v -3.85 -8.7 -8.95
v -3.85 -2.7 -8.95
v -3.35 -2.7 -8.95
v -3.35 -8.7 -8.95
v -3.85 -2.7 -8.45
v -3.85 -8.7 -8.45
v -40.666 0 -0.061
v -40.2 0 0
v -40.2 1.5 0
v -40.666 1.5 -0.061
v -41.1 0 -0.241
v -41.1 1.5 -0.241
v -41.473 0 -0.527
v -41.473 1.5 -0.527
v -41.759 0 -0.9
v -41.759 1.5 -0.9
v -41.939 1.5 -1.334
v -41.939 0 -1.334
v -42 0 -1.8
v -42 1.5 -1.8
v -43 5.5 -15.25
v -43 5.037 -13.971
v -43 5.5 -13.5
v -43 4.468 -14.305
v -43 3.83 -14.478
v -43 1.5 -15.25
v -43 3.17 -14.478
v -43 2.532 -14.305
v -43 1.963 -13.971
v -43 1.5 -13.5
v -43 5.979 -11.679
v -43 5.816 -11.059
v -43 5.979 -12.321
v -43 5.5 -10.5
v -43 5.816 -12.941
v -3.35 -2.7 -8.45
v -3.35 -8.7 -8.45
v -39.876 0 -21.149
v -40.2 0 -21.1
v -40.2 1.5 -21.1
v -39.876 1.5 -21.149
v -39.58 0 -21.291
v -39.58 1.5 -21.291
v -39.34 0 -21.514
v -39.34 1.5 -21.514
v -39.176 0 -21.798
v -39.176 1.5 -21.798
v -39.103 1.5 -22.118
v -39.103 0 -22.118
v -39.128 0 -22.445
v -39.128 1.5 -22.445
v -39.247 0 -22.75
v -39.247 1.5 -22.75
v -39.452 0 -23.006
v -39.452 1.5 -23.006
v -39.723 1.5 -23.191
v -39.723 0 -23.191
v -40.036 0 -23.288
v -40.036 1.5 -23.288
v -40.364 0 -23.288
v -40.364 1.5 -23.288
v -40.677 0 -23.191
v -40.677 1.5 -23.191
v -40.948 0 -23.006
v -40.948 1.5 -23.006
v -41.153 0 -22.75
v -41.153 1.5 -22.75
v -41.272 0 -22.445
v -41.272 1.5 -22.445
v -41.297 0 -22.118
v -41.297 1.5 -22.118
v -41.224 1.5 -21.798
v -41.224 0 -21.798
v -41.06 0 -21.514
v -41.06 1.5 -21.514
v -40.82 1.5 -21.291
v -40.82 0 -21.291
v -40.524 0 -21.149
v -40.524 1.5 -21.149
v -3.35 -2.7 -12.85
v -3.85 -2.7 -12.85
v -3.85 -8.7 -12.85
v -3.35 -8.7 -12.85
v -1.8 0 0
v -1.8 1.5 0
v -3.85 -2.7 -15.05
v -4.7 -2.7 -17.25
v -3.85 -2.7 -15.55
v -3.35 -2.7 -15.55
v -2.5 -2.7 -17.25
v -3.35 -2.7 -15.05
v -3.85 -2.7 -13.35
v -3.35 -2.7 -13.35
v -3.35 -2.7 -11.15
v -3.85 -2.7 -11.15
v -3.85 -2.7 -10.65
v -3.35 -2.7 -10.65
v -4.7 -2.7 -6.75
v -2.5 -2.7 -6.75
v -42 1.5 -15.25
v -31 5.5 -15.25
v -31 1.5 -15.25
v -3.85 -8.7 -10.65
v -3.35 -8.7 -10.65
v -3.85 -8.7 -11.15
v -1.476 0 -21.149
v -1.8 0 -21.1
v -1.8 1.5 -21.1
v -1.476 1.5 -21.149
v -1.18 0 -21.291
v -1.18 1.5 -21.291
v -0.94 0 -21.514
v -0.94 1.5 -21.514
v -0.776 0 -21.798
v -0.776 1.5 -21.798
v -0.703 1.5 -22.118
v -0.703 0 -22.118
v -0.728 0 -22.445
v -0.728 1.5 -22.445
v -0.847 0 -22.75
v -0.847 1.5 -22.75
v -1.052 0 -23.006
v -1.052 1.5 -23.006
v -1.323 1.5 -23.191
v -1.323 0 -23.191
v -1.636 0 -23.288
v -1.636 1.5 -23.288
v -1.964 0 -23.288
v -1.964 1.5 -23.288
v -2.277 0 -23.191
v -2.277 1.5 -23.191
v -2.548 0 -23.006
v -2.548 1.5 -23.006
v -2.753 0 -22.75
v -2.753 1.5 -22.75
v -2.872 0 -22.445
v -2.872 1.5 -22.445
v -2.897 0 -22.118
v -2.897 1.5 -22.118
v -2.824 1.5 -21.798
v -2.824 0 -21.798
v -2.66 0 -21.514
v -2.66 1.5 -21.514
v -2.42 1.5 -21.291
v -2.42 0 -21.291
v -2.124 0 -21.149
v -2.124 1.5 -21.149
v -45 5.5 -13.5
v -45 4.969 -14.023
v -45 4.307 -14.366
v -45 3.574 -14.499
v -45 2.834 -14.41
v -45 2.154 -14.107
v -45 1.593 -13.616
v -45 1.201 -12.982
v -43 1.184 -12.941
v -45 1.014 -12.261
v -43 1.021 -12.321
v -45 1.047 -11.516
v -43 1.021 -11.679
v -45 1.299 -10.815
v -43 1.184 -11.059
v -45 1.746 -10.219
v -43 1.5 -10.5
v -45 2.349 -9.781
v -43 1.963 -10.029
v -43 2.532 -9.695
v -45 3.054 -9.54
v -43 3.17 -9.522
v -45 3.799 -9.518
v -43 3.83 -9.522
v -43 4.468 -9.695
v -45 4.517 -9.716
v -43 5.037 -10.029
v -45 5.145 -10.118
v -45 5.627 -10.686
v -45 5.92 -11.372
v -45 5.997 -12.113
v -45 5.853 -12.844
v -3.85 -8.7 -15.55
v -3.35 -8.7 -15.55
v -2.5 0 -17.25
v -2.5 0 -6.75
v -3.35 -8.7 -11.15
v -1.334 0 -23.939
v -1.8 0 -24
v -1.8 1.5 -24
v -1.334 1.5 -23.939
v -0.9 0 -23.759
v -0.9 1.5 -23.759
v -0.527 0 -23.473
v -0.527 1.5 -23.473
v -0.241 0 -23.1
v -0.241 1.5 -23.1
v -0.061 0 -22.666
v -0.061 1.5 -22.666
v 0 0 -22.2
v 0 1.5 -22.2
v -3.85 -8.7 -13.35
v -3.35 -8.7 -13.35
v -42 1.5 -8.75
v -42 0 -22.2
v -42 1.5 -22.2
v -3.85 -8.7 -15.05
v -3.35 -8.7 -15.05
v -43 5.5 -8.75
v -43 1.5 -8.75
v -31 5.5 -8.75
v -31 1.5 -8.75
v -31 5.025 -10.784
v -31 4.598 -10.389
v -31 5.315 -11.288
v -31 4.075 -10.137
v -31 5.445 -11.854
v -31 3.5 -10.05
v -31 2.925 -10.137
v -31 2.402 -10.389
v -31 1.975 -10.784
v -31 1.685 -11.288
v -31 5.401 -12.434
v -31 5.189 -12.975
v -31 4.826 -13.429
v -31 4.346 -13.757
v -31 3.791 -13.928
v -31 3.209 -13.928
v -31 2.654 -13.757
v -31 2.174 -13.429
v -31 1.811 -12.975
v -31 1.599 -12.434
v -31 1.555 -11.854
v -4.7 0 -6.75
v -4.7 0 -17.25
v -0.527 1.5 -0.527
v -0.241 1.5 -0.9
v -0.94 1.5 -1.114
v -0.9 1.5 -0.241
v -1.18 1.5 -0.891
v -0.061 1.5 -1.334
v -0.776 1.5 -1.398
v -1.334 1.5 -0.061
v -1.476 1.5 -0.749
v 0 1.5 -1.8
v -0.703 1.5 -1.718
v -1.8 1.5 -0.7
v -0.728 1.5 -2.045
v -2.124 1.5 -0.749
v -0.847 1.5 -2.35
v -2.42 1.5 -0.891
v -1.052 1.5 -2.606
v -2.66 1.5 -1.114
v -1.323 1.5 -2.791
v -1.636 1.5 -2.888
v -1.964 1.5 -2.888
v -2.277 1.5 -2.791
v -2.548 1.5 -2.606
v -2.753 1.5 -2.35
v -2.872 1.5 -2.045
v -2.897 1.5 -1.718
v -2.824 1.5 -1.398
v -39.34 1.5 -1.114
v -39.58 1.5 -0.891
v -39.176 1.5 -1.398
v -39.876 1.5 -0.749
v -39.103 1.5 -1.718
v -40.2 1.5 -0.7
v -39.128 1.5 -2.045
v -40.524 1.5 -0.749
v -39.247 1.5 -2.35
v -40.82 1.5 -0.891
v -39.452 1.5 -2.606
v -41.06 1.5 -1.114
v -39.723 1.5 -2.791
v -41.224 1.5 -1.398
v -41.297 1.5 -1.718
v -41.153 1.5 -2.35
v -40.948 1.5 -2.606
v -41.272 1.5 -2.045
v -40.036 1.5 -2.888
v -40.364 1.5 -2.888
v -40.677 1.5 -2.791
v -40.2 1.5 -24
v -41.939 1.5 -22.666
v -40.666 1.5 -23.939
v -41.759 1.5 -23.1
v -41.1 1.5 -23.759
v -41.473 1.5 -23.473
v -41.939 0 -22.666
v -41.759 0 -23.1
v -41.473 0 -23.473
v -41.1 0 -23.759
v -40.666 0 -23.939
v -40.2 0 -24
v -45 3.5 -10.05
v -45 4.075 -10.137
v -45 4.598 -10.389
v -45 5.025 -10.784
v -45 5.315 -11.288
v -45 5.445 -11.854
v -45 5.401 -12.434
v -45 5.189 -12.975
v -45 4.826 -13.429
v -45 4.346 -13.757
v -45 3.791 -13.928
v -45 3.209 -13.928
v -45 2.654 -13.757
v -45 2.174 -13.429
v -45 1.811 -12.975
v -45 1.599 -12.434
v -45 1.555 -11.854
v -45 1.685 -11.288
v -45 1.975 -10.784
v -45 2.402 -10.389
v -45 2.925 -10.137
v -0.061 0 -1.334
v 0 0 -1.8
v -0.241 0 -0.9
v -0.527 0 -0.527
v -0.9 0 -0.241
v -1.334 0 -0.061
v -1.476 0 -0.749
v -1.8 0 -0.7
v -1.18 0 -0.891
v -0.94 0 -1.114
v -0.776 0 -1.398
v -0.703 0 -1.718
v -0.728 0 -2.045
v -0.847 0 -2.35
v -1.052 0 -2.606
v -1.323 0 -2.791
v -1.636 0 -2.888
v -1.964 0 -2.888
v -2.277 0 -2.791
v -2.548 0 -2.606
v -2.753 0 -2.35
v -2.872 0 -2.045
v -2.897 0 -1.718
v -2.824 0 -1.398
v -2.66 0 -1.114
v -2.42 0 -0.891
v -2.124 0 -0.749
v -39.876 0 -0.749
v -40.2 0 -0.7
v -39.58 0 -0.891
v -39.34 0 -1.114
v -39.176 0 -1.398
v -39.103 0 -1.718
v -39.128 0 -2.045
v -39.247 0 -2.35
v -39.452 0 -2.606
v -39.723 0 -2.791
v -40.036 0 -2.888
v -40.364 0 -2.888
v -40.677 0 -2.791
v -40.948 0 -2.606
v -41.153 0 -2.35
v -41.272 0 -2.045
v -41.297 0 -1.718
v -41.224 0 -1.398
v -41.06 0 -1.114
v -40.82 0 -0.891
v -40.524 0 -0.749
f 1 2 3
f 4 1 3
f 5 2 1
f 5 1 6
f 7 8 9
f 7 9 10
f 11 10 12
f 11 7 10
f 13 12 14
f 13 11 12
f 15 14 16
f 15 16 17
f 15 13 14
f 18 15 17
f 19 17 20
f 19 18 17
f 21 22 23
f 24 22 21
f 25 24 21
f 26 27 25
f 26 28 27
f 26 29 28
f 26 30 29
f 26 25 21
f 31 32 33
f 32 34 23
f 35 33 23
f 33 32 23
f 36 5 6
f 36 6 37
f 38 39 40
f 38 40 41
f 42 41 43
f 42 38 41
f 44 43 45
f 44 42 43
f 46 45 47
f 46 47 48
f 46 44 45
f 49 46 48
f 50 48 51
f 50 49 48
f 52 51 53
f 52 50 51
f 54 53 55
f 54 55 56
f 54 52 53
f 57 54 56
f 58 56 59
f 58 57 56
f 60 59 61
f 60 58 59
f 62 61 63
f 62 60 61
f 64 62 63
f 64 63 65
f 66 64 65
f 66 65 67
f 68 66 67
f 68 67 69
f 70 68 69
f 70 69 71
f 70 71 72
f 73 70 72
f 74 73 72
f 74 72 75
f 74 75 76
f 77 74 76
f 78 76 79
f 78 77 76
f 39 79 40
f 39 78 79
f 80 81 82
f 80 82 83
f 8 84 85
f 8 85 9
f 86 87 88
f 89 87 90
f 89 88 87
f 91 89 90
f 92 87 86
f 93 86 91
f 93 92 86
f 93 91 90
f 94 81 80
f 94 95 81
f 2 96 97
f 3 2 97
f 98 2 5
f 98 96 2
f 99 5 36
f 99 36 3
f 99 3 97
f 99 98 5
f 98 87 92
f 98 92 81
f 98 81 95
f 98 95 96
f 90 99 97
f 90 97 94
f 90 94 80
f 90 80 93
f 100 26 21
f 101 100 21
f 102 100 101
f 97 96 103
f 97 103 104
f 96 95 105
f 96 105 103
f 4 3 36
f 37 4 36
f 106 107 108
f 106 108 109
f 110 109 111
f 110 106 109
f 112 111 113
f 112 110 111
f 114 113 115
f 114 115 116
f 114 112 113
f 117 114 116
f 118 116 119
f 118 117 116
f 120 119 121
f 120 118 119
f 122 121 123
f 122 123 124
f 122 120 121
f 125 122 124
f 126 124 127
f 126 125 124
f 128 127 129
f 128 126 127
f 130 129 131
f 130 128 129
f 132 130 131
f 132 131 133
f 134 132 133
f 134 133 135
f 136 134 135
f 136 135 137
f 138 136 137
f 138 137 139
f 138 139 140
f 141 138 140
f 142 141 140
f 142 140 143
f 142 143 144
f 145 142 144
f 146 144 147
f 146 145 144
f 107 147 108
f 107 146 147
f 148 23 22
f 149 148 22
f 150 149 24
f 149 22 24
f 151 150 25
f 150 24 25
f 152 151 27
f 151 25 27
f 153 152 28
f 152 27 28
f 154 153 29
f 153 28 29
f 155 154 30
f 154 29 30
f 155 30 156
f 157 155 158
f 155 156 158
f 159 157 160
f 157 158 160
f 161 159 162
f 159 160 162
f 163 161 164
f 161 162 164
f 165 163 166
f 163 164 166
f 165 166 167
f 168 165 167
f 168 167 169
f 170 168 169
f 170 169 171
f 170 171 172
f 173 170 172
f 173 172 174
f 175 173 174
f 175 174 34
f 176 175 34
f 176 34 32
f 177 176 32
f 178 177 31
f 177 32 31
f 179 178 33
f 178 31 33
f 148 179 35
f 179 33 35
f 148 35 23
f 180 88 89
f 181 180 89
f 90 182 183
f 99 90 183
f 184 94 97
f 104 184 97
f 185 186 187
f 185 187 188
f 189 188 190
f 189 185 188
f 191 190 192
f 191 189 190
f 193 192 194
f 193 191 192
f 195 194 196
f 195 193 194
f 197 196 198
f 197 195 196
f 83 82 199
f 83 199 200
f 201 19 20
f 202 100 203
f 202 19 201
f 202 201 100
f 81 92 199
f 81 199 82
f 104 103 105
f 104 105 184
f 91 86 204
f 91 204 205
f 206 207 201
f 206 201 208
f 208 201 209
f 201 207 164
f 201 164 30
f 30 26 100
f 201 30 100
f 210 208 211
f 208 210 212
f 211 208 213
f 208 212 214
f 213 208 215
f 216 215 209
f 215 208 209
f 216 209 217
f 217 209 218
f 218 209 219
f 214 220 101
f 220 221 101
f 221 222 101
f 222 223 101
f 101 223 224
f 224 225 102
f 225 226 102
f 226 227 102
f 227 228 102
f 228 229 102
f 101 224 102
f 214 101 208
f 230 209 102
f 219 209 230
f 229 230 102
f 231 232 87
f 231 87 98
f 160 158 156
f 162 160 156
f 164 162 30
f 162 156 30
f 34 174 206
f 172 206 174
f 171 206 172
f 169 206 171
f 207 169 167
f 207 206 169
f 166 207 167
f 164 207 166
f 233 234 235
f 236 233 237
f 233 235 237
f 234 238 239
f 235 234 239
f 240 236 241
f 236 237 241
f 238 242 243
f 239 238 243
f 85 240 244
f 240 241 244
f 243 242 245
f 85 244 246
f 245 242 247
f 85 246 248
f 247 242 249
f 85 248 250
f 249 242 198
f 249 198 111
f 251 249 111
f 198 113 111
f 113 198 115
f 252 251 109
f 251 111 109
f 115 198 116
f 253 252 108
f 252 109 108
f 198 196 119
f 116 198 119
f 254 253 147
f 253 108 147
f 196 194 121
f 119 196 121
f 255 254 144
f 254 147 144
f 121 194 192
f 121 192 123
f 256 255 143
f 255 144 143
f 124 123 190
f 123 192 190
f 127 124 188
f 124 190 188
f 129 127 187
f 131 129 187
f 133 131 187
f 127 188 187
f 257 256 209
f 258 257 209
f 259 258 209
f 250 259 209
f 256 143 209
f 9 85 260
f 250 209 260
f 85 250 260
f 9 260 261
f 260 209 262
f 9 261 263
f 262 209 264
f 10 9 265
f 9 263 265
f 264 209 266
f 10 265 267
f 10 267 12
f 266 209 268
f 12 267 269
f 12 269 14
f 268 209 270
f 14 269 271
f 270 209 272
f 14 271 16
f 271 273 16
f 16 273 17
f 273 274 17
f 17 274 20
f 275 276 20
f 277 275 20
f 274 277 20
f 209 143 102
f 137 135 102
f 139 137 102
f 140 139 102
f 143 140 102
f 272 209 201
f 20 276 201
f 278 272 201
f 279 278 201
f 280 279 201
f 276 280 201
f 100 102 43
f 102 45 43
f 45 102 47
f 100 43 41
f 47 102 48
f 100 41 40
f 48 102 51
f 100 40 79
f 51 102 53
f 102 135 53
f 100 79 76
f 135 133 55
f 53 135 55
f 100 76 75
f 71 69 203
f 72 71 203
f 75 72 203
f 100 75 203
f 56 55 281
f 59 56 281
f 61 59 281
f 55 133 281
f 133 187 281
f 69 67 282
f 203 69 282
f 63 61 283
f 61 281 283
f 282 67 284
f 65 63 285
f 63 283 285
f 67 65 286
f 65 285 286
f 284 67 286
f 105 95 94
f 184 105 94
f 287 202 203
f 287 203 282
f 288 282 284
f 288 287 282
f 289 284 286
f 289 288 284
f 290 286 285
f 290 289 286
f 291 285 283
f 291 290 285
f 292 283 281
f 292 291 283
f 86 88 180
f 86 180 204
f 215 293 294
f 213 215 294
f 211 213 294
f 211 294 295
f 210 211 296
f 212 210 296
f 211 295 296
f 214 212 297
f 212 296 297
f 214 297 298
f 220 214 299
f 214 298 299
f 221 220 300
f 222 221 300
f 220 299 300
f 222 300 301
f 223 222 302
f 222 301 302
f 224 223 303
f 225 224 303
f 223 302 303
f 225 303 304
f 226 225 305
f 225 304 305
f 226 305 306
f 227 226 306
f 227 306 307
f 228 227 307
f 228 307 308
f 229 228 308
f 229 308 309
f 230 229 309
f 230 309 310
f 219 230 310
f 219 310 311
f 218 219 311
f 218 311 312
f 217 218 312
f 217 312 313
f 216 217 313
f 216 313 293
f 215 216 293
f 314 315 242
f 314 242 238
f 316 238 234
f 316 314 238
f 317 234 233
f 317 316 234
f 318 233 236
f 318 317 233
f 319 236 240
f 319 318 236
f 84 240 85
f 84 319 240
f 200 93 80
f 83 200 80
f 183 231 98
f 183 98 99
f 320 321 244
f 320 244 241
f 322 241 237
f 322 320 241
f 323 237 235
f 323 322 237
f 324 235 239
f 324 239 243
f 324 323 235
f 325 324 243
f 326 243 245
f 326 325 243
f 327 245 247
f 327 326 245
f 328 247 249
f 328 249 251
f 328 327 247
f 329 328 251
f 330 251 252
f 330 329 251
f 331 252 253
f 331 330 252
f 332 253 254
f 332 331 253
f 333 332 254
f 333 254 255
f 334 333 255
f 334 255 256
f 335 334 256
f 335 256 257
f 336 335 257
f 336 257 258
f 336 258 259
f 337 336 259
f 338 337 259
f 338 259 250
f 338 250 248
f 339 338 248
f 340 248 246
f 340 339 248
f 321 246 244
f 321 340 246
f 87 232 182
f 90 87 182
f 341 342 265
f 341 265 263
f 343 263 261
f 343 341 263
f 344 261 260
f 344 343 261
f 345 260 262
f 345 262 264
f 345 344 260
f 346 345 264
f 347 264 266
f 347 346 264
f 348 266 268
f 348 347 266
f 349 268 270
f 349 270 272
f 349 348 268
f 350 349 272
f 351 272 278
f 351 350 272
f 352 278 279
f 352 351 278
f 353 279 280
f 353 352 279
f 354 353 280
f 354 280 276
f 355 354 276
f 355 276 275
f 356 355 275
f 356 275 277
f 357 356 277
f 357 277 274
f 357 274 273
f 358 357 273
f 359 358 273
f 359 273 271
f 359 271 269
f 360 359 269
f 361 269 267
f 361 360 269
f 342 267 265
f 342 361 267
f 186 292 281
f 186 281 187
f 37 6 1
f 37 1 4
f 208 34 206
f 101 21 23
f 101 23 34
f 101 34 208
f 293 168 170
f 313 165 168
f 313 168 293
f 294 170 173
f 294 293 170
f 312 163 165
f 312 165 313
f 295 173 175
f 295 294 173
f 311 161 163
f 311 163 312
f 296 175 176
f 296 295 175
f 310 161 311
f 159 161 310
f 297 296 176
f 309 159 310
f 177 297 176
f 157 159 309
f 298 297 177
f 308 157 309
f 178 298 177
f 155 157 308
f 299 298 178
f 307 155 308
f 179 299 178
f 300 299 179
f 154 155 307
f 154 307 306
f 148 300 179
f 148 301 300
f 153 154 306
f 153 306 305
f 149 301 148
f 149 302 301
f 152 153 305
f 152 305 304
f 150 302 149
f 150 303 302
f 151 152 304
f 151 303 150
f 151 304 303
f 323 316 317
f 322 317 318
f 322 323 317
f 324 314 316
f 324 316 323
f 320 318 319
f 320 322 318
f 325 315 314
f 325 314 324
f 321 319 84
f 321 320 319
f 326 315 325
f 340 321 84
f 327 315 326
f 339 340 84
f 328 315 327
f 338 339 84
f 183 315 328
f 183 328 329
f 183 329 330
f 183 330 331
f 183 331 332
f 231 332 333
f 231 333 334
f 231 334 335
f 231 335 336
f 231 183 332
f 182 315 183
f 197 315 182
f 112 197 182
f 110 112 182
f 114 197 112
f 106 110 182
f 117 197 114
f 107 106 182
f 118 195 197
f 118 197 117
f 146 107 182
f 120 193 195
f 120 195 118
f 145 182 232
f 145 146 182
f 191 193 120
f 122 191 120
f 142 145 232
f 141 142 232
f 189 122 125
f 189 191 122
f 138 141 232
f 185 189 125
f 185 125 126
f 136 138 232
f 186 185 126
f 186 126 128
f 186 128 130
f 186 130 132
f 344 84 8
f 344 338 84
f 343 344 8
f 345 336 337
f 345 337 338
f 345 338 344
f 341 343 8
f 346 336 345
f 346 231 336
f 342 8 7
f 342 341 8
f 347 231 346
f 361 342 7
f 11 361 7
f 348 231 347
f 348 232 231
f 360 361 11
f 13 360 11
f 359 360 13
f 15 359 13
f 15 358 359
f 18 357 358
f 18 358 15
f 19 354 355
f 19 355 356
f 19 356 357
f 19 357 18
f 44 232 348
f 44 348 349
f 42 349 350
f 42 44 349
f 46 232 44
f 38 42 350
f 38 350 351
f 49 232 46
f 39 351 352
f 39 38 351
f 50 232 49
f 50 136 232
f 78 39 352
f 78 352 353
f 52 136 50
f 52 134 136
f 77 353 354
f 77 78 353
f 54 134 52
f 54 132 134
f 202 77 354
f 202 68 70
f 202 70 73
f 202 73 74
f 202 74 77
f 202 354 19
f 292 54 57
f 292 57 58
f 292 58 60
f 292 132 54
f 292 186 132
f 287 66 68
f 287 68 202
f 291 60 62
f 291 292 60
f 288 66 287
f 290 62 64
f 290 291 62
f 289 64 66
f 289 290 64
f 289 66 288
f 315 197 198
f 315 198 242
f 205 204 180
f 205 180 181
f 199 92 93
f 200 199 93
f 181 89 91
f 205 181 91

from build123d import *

# Parameters (mm, degrees)
SKETCH1_R           = 1.1
BOSS_EXTRUDE1_DEPTH = 1.5
SKETCH2_W           = 12
SKETCH2_H           = 6.5
BOSS_EXTRUDE2_DEPTH = 4
SKETCH5_R           = 2.5
BOSS_EXTRUDE3_DEPTH = 2
SKETCH6_R           = 1.95
CUT_EXTRUDE1_DEPTH  = 15.02758553
SKETCH8_W           = 2.2
SKETCH8_H           = 10.5
BOSS_EXTRUDE4_DEPTH = 2.7
SKETCH9_W           = 0.5
SKETCH9_H           = 0.5
BOSS_EXTRUDE5_DEPTH = 6
LPATTERN1_COUNT     = 4
LPATTERN1_PITCH     = 2.2


with BuildPart() as part:
    # Sketch1 → Boss-Extrude1 (new body)
    with BuildSketch(Plane(origin=(0, 0, 0), x_dir=(1, 0, 0), z_dir=(0, 1, 0))):
        with BuildLine():
            Line((-1.8, 0), (-40.2, 0))
            ThreePointArc((-40.2, 0), (-41.472792206, 0.527207794), (-42, 1.8))
            Line((-42, 1.8), (-42, 22.2))
            ThreePointArc((-42, 22.2), (-41.472792206, 23.472792206), (-40.2, 24))
            Line((-40.2, 24), (-1.8, 24))
            ThreePointArc((-1.8, 24), (-0.527207794, 23.472792206), (0, 22.2))
            Line((0, 22.2), (0, 1.8))
            ThreePointArc((0, 1.8), (-0.527207794, 0.527207794), (-1.8, 0))
        make_face()
        with Locations(Location((-40.2, 1.8, 0), (0, 0, 270))):
            Circle(SKETCH1_R, mode=Mode.SUBTRACT)
        with Locations(Location((-1.8, 1.8, 0), (0, 0, 270))):
            Circle(SKETCH1_R, mode=Mode.SUBTRACT)
        with Locations(Location((-1.8, 22.2, 0), (0, 0, 270))):
            Circle(SKETCH1_R, mode=Mode.SUBTRACT)
        with Locations(Location((-40.2, 22.2, 0), (0, 0, 270))):
            Circle(SKETCH1_R, mode=Mode.SUBTRACT)
    extrude(amount=BOSS_EXTRUDE1_DEPTH)

    # Sketch2 → Boss-Extrude2 (add)
    with BuildSketch(Plane(origin=(0, 1.5, 0), x_dir=(1, 0, 0), z_dir=(0, 1, 0))):
        with Locations((-37, 12)):
            Rectangle(SKETCH2_W, SKETCH2_H)
    extrude(amount=BOSS_EXTRUDE2_DEPTH)

    # Sketch5 → Boss-Extrude3 (add)
    with BuildSketch(Plane.ZY.offset(43)):
        with Locations(Location((-12, 3.5, 0), (0, 0, 126.869897646))):
            Circle(SKETCH5_R)
    extrude(amount=BOSS_EXTRUDE3_DEPTH)

    # Sketch6 → Cut-Extrude1 (cut)
    with BuildSketch(Plane.ZY.offset(45)):
        with Locations((-12, 3.5)):
            Circle(SKETCH6_R)
    extrude(amount=-CUT_EXTRUDE1_DEPTH, mode=Mode.SUBTRACT)

    # Sketch8 → Boss-Extrude4 (add)
    with BuildSketch(Plane.XZ):
        with Locations((-3.6, -12)):
            Rectangle(SKETCH8_W, SKETCH8_H)
    extrude(amount=BOSS_EXTRUDE4_DEPTH)

    # Sketch9 → Boss-Extrude5 (add)
    with BuildSketch(Plane.XZ.offset(2.7)):
        with Locations((-3.6, -8.7)):
            Rectangle(SKETCH9_W, SKETCH9_H)
    boss_extrude5 = extrude(amount=BOSS_EXTRUDE5_DEPTH)

    # LPattern1: Boss-Extrude5 ×4
    with Locations(*[(0, 0, -i * LPATTERN1_PITCH) for i in range(1, LPATTERN1_COUNT)]):
        add(boss_extrude5)


solid = part.part
